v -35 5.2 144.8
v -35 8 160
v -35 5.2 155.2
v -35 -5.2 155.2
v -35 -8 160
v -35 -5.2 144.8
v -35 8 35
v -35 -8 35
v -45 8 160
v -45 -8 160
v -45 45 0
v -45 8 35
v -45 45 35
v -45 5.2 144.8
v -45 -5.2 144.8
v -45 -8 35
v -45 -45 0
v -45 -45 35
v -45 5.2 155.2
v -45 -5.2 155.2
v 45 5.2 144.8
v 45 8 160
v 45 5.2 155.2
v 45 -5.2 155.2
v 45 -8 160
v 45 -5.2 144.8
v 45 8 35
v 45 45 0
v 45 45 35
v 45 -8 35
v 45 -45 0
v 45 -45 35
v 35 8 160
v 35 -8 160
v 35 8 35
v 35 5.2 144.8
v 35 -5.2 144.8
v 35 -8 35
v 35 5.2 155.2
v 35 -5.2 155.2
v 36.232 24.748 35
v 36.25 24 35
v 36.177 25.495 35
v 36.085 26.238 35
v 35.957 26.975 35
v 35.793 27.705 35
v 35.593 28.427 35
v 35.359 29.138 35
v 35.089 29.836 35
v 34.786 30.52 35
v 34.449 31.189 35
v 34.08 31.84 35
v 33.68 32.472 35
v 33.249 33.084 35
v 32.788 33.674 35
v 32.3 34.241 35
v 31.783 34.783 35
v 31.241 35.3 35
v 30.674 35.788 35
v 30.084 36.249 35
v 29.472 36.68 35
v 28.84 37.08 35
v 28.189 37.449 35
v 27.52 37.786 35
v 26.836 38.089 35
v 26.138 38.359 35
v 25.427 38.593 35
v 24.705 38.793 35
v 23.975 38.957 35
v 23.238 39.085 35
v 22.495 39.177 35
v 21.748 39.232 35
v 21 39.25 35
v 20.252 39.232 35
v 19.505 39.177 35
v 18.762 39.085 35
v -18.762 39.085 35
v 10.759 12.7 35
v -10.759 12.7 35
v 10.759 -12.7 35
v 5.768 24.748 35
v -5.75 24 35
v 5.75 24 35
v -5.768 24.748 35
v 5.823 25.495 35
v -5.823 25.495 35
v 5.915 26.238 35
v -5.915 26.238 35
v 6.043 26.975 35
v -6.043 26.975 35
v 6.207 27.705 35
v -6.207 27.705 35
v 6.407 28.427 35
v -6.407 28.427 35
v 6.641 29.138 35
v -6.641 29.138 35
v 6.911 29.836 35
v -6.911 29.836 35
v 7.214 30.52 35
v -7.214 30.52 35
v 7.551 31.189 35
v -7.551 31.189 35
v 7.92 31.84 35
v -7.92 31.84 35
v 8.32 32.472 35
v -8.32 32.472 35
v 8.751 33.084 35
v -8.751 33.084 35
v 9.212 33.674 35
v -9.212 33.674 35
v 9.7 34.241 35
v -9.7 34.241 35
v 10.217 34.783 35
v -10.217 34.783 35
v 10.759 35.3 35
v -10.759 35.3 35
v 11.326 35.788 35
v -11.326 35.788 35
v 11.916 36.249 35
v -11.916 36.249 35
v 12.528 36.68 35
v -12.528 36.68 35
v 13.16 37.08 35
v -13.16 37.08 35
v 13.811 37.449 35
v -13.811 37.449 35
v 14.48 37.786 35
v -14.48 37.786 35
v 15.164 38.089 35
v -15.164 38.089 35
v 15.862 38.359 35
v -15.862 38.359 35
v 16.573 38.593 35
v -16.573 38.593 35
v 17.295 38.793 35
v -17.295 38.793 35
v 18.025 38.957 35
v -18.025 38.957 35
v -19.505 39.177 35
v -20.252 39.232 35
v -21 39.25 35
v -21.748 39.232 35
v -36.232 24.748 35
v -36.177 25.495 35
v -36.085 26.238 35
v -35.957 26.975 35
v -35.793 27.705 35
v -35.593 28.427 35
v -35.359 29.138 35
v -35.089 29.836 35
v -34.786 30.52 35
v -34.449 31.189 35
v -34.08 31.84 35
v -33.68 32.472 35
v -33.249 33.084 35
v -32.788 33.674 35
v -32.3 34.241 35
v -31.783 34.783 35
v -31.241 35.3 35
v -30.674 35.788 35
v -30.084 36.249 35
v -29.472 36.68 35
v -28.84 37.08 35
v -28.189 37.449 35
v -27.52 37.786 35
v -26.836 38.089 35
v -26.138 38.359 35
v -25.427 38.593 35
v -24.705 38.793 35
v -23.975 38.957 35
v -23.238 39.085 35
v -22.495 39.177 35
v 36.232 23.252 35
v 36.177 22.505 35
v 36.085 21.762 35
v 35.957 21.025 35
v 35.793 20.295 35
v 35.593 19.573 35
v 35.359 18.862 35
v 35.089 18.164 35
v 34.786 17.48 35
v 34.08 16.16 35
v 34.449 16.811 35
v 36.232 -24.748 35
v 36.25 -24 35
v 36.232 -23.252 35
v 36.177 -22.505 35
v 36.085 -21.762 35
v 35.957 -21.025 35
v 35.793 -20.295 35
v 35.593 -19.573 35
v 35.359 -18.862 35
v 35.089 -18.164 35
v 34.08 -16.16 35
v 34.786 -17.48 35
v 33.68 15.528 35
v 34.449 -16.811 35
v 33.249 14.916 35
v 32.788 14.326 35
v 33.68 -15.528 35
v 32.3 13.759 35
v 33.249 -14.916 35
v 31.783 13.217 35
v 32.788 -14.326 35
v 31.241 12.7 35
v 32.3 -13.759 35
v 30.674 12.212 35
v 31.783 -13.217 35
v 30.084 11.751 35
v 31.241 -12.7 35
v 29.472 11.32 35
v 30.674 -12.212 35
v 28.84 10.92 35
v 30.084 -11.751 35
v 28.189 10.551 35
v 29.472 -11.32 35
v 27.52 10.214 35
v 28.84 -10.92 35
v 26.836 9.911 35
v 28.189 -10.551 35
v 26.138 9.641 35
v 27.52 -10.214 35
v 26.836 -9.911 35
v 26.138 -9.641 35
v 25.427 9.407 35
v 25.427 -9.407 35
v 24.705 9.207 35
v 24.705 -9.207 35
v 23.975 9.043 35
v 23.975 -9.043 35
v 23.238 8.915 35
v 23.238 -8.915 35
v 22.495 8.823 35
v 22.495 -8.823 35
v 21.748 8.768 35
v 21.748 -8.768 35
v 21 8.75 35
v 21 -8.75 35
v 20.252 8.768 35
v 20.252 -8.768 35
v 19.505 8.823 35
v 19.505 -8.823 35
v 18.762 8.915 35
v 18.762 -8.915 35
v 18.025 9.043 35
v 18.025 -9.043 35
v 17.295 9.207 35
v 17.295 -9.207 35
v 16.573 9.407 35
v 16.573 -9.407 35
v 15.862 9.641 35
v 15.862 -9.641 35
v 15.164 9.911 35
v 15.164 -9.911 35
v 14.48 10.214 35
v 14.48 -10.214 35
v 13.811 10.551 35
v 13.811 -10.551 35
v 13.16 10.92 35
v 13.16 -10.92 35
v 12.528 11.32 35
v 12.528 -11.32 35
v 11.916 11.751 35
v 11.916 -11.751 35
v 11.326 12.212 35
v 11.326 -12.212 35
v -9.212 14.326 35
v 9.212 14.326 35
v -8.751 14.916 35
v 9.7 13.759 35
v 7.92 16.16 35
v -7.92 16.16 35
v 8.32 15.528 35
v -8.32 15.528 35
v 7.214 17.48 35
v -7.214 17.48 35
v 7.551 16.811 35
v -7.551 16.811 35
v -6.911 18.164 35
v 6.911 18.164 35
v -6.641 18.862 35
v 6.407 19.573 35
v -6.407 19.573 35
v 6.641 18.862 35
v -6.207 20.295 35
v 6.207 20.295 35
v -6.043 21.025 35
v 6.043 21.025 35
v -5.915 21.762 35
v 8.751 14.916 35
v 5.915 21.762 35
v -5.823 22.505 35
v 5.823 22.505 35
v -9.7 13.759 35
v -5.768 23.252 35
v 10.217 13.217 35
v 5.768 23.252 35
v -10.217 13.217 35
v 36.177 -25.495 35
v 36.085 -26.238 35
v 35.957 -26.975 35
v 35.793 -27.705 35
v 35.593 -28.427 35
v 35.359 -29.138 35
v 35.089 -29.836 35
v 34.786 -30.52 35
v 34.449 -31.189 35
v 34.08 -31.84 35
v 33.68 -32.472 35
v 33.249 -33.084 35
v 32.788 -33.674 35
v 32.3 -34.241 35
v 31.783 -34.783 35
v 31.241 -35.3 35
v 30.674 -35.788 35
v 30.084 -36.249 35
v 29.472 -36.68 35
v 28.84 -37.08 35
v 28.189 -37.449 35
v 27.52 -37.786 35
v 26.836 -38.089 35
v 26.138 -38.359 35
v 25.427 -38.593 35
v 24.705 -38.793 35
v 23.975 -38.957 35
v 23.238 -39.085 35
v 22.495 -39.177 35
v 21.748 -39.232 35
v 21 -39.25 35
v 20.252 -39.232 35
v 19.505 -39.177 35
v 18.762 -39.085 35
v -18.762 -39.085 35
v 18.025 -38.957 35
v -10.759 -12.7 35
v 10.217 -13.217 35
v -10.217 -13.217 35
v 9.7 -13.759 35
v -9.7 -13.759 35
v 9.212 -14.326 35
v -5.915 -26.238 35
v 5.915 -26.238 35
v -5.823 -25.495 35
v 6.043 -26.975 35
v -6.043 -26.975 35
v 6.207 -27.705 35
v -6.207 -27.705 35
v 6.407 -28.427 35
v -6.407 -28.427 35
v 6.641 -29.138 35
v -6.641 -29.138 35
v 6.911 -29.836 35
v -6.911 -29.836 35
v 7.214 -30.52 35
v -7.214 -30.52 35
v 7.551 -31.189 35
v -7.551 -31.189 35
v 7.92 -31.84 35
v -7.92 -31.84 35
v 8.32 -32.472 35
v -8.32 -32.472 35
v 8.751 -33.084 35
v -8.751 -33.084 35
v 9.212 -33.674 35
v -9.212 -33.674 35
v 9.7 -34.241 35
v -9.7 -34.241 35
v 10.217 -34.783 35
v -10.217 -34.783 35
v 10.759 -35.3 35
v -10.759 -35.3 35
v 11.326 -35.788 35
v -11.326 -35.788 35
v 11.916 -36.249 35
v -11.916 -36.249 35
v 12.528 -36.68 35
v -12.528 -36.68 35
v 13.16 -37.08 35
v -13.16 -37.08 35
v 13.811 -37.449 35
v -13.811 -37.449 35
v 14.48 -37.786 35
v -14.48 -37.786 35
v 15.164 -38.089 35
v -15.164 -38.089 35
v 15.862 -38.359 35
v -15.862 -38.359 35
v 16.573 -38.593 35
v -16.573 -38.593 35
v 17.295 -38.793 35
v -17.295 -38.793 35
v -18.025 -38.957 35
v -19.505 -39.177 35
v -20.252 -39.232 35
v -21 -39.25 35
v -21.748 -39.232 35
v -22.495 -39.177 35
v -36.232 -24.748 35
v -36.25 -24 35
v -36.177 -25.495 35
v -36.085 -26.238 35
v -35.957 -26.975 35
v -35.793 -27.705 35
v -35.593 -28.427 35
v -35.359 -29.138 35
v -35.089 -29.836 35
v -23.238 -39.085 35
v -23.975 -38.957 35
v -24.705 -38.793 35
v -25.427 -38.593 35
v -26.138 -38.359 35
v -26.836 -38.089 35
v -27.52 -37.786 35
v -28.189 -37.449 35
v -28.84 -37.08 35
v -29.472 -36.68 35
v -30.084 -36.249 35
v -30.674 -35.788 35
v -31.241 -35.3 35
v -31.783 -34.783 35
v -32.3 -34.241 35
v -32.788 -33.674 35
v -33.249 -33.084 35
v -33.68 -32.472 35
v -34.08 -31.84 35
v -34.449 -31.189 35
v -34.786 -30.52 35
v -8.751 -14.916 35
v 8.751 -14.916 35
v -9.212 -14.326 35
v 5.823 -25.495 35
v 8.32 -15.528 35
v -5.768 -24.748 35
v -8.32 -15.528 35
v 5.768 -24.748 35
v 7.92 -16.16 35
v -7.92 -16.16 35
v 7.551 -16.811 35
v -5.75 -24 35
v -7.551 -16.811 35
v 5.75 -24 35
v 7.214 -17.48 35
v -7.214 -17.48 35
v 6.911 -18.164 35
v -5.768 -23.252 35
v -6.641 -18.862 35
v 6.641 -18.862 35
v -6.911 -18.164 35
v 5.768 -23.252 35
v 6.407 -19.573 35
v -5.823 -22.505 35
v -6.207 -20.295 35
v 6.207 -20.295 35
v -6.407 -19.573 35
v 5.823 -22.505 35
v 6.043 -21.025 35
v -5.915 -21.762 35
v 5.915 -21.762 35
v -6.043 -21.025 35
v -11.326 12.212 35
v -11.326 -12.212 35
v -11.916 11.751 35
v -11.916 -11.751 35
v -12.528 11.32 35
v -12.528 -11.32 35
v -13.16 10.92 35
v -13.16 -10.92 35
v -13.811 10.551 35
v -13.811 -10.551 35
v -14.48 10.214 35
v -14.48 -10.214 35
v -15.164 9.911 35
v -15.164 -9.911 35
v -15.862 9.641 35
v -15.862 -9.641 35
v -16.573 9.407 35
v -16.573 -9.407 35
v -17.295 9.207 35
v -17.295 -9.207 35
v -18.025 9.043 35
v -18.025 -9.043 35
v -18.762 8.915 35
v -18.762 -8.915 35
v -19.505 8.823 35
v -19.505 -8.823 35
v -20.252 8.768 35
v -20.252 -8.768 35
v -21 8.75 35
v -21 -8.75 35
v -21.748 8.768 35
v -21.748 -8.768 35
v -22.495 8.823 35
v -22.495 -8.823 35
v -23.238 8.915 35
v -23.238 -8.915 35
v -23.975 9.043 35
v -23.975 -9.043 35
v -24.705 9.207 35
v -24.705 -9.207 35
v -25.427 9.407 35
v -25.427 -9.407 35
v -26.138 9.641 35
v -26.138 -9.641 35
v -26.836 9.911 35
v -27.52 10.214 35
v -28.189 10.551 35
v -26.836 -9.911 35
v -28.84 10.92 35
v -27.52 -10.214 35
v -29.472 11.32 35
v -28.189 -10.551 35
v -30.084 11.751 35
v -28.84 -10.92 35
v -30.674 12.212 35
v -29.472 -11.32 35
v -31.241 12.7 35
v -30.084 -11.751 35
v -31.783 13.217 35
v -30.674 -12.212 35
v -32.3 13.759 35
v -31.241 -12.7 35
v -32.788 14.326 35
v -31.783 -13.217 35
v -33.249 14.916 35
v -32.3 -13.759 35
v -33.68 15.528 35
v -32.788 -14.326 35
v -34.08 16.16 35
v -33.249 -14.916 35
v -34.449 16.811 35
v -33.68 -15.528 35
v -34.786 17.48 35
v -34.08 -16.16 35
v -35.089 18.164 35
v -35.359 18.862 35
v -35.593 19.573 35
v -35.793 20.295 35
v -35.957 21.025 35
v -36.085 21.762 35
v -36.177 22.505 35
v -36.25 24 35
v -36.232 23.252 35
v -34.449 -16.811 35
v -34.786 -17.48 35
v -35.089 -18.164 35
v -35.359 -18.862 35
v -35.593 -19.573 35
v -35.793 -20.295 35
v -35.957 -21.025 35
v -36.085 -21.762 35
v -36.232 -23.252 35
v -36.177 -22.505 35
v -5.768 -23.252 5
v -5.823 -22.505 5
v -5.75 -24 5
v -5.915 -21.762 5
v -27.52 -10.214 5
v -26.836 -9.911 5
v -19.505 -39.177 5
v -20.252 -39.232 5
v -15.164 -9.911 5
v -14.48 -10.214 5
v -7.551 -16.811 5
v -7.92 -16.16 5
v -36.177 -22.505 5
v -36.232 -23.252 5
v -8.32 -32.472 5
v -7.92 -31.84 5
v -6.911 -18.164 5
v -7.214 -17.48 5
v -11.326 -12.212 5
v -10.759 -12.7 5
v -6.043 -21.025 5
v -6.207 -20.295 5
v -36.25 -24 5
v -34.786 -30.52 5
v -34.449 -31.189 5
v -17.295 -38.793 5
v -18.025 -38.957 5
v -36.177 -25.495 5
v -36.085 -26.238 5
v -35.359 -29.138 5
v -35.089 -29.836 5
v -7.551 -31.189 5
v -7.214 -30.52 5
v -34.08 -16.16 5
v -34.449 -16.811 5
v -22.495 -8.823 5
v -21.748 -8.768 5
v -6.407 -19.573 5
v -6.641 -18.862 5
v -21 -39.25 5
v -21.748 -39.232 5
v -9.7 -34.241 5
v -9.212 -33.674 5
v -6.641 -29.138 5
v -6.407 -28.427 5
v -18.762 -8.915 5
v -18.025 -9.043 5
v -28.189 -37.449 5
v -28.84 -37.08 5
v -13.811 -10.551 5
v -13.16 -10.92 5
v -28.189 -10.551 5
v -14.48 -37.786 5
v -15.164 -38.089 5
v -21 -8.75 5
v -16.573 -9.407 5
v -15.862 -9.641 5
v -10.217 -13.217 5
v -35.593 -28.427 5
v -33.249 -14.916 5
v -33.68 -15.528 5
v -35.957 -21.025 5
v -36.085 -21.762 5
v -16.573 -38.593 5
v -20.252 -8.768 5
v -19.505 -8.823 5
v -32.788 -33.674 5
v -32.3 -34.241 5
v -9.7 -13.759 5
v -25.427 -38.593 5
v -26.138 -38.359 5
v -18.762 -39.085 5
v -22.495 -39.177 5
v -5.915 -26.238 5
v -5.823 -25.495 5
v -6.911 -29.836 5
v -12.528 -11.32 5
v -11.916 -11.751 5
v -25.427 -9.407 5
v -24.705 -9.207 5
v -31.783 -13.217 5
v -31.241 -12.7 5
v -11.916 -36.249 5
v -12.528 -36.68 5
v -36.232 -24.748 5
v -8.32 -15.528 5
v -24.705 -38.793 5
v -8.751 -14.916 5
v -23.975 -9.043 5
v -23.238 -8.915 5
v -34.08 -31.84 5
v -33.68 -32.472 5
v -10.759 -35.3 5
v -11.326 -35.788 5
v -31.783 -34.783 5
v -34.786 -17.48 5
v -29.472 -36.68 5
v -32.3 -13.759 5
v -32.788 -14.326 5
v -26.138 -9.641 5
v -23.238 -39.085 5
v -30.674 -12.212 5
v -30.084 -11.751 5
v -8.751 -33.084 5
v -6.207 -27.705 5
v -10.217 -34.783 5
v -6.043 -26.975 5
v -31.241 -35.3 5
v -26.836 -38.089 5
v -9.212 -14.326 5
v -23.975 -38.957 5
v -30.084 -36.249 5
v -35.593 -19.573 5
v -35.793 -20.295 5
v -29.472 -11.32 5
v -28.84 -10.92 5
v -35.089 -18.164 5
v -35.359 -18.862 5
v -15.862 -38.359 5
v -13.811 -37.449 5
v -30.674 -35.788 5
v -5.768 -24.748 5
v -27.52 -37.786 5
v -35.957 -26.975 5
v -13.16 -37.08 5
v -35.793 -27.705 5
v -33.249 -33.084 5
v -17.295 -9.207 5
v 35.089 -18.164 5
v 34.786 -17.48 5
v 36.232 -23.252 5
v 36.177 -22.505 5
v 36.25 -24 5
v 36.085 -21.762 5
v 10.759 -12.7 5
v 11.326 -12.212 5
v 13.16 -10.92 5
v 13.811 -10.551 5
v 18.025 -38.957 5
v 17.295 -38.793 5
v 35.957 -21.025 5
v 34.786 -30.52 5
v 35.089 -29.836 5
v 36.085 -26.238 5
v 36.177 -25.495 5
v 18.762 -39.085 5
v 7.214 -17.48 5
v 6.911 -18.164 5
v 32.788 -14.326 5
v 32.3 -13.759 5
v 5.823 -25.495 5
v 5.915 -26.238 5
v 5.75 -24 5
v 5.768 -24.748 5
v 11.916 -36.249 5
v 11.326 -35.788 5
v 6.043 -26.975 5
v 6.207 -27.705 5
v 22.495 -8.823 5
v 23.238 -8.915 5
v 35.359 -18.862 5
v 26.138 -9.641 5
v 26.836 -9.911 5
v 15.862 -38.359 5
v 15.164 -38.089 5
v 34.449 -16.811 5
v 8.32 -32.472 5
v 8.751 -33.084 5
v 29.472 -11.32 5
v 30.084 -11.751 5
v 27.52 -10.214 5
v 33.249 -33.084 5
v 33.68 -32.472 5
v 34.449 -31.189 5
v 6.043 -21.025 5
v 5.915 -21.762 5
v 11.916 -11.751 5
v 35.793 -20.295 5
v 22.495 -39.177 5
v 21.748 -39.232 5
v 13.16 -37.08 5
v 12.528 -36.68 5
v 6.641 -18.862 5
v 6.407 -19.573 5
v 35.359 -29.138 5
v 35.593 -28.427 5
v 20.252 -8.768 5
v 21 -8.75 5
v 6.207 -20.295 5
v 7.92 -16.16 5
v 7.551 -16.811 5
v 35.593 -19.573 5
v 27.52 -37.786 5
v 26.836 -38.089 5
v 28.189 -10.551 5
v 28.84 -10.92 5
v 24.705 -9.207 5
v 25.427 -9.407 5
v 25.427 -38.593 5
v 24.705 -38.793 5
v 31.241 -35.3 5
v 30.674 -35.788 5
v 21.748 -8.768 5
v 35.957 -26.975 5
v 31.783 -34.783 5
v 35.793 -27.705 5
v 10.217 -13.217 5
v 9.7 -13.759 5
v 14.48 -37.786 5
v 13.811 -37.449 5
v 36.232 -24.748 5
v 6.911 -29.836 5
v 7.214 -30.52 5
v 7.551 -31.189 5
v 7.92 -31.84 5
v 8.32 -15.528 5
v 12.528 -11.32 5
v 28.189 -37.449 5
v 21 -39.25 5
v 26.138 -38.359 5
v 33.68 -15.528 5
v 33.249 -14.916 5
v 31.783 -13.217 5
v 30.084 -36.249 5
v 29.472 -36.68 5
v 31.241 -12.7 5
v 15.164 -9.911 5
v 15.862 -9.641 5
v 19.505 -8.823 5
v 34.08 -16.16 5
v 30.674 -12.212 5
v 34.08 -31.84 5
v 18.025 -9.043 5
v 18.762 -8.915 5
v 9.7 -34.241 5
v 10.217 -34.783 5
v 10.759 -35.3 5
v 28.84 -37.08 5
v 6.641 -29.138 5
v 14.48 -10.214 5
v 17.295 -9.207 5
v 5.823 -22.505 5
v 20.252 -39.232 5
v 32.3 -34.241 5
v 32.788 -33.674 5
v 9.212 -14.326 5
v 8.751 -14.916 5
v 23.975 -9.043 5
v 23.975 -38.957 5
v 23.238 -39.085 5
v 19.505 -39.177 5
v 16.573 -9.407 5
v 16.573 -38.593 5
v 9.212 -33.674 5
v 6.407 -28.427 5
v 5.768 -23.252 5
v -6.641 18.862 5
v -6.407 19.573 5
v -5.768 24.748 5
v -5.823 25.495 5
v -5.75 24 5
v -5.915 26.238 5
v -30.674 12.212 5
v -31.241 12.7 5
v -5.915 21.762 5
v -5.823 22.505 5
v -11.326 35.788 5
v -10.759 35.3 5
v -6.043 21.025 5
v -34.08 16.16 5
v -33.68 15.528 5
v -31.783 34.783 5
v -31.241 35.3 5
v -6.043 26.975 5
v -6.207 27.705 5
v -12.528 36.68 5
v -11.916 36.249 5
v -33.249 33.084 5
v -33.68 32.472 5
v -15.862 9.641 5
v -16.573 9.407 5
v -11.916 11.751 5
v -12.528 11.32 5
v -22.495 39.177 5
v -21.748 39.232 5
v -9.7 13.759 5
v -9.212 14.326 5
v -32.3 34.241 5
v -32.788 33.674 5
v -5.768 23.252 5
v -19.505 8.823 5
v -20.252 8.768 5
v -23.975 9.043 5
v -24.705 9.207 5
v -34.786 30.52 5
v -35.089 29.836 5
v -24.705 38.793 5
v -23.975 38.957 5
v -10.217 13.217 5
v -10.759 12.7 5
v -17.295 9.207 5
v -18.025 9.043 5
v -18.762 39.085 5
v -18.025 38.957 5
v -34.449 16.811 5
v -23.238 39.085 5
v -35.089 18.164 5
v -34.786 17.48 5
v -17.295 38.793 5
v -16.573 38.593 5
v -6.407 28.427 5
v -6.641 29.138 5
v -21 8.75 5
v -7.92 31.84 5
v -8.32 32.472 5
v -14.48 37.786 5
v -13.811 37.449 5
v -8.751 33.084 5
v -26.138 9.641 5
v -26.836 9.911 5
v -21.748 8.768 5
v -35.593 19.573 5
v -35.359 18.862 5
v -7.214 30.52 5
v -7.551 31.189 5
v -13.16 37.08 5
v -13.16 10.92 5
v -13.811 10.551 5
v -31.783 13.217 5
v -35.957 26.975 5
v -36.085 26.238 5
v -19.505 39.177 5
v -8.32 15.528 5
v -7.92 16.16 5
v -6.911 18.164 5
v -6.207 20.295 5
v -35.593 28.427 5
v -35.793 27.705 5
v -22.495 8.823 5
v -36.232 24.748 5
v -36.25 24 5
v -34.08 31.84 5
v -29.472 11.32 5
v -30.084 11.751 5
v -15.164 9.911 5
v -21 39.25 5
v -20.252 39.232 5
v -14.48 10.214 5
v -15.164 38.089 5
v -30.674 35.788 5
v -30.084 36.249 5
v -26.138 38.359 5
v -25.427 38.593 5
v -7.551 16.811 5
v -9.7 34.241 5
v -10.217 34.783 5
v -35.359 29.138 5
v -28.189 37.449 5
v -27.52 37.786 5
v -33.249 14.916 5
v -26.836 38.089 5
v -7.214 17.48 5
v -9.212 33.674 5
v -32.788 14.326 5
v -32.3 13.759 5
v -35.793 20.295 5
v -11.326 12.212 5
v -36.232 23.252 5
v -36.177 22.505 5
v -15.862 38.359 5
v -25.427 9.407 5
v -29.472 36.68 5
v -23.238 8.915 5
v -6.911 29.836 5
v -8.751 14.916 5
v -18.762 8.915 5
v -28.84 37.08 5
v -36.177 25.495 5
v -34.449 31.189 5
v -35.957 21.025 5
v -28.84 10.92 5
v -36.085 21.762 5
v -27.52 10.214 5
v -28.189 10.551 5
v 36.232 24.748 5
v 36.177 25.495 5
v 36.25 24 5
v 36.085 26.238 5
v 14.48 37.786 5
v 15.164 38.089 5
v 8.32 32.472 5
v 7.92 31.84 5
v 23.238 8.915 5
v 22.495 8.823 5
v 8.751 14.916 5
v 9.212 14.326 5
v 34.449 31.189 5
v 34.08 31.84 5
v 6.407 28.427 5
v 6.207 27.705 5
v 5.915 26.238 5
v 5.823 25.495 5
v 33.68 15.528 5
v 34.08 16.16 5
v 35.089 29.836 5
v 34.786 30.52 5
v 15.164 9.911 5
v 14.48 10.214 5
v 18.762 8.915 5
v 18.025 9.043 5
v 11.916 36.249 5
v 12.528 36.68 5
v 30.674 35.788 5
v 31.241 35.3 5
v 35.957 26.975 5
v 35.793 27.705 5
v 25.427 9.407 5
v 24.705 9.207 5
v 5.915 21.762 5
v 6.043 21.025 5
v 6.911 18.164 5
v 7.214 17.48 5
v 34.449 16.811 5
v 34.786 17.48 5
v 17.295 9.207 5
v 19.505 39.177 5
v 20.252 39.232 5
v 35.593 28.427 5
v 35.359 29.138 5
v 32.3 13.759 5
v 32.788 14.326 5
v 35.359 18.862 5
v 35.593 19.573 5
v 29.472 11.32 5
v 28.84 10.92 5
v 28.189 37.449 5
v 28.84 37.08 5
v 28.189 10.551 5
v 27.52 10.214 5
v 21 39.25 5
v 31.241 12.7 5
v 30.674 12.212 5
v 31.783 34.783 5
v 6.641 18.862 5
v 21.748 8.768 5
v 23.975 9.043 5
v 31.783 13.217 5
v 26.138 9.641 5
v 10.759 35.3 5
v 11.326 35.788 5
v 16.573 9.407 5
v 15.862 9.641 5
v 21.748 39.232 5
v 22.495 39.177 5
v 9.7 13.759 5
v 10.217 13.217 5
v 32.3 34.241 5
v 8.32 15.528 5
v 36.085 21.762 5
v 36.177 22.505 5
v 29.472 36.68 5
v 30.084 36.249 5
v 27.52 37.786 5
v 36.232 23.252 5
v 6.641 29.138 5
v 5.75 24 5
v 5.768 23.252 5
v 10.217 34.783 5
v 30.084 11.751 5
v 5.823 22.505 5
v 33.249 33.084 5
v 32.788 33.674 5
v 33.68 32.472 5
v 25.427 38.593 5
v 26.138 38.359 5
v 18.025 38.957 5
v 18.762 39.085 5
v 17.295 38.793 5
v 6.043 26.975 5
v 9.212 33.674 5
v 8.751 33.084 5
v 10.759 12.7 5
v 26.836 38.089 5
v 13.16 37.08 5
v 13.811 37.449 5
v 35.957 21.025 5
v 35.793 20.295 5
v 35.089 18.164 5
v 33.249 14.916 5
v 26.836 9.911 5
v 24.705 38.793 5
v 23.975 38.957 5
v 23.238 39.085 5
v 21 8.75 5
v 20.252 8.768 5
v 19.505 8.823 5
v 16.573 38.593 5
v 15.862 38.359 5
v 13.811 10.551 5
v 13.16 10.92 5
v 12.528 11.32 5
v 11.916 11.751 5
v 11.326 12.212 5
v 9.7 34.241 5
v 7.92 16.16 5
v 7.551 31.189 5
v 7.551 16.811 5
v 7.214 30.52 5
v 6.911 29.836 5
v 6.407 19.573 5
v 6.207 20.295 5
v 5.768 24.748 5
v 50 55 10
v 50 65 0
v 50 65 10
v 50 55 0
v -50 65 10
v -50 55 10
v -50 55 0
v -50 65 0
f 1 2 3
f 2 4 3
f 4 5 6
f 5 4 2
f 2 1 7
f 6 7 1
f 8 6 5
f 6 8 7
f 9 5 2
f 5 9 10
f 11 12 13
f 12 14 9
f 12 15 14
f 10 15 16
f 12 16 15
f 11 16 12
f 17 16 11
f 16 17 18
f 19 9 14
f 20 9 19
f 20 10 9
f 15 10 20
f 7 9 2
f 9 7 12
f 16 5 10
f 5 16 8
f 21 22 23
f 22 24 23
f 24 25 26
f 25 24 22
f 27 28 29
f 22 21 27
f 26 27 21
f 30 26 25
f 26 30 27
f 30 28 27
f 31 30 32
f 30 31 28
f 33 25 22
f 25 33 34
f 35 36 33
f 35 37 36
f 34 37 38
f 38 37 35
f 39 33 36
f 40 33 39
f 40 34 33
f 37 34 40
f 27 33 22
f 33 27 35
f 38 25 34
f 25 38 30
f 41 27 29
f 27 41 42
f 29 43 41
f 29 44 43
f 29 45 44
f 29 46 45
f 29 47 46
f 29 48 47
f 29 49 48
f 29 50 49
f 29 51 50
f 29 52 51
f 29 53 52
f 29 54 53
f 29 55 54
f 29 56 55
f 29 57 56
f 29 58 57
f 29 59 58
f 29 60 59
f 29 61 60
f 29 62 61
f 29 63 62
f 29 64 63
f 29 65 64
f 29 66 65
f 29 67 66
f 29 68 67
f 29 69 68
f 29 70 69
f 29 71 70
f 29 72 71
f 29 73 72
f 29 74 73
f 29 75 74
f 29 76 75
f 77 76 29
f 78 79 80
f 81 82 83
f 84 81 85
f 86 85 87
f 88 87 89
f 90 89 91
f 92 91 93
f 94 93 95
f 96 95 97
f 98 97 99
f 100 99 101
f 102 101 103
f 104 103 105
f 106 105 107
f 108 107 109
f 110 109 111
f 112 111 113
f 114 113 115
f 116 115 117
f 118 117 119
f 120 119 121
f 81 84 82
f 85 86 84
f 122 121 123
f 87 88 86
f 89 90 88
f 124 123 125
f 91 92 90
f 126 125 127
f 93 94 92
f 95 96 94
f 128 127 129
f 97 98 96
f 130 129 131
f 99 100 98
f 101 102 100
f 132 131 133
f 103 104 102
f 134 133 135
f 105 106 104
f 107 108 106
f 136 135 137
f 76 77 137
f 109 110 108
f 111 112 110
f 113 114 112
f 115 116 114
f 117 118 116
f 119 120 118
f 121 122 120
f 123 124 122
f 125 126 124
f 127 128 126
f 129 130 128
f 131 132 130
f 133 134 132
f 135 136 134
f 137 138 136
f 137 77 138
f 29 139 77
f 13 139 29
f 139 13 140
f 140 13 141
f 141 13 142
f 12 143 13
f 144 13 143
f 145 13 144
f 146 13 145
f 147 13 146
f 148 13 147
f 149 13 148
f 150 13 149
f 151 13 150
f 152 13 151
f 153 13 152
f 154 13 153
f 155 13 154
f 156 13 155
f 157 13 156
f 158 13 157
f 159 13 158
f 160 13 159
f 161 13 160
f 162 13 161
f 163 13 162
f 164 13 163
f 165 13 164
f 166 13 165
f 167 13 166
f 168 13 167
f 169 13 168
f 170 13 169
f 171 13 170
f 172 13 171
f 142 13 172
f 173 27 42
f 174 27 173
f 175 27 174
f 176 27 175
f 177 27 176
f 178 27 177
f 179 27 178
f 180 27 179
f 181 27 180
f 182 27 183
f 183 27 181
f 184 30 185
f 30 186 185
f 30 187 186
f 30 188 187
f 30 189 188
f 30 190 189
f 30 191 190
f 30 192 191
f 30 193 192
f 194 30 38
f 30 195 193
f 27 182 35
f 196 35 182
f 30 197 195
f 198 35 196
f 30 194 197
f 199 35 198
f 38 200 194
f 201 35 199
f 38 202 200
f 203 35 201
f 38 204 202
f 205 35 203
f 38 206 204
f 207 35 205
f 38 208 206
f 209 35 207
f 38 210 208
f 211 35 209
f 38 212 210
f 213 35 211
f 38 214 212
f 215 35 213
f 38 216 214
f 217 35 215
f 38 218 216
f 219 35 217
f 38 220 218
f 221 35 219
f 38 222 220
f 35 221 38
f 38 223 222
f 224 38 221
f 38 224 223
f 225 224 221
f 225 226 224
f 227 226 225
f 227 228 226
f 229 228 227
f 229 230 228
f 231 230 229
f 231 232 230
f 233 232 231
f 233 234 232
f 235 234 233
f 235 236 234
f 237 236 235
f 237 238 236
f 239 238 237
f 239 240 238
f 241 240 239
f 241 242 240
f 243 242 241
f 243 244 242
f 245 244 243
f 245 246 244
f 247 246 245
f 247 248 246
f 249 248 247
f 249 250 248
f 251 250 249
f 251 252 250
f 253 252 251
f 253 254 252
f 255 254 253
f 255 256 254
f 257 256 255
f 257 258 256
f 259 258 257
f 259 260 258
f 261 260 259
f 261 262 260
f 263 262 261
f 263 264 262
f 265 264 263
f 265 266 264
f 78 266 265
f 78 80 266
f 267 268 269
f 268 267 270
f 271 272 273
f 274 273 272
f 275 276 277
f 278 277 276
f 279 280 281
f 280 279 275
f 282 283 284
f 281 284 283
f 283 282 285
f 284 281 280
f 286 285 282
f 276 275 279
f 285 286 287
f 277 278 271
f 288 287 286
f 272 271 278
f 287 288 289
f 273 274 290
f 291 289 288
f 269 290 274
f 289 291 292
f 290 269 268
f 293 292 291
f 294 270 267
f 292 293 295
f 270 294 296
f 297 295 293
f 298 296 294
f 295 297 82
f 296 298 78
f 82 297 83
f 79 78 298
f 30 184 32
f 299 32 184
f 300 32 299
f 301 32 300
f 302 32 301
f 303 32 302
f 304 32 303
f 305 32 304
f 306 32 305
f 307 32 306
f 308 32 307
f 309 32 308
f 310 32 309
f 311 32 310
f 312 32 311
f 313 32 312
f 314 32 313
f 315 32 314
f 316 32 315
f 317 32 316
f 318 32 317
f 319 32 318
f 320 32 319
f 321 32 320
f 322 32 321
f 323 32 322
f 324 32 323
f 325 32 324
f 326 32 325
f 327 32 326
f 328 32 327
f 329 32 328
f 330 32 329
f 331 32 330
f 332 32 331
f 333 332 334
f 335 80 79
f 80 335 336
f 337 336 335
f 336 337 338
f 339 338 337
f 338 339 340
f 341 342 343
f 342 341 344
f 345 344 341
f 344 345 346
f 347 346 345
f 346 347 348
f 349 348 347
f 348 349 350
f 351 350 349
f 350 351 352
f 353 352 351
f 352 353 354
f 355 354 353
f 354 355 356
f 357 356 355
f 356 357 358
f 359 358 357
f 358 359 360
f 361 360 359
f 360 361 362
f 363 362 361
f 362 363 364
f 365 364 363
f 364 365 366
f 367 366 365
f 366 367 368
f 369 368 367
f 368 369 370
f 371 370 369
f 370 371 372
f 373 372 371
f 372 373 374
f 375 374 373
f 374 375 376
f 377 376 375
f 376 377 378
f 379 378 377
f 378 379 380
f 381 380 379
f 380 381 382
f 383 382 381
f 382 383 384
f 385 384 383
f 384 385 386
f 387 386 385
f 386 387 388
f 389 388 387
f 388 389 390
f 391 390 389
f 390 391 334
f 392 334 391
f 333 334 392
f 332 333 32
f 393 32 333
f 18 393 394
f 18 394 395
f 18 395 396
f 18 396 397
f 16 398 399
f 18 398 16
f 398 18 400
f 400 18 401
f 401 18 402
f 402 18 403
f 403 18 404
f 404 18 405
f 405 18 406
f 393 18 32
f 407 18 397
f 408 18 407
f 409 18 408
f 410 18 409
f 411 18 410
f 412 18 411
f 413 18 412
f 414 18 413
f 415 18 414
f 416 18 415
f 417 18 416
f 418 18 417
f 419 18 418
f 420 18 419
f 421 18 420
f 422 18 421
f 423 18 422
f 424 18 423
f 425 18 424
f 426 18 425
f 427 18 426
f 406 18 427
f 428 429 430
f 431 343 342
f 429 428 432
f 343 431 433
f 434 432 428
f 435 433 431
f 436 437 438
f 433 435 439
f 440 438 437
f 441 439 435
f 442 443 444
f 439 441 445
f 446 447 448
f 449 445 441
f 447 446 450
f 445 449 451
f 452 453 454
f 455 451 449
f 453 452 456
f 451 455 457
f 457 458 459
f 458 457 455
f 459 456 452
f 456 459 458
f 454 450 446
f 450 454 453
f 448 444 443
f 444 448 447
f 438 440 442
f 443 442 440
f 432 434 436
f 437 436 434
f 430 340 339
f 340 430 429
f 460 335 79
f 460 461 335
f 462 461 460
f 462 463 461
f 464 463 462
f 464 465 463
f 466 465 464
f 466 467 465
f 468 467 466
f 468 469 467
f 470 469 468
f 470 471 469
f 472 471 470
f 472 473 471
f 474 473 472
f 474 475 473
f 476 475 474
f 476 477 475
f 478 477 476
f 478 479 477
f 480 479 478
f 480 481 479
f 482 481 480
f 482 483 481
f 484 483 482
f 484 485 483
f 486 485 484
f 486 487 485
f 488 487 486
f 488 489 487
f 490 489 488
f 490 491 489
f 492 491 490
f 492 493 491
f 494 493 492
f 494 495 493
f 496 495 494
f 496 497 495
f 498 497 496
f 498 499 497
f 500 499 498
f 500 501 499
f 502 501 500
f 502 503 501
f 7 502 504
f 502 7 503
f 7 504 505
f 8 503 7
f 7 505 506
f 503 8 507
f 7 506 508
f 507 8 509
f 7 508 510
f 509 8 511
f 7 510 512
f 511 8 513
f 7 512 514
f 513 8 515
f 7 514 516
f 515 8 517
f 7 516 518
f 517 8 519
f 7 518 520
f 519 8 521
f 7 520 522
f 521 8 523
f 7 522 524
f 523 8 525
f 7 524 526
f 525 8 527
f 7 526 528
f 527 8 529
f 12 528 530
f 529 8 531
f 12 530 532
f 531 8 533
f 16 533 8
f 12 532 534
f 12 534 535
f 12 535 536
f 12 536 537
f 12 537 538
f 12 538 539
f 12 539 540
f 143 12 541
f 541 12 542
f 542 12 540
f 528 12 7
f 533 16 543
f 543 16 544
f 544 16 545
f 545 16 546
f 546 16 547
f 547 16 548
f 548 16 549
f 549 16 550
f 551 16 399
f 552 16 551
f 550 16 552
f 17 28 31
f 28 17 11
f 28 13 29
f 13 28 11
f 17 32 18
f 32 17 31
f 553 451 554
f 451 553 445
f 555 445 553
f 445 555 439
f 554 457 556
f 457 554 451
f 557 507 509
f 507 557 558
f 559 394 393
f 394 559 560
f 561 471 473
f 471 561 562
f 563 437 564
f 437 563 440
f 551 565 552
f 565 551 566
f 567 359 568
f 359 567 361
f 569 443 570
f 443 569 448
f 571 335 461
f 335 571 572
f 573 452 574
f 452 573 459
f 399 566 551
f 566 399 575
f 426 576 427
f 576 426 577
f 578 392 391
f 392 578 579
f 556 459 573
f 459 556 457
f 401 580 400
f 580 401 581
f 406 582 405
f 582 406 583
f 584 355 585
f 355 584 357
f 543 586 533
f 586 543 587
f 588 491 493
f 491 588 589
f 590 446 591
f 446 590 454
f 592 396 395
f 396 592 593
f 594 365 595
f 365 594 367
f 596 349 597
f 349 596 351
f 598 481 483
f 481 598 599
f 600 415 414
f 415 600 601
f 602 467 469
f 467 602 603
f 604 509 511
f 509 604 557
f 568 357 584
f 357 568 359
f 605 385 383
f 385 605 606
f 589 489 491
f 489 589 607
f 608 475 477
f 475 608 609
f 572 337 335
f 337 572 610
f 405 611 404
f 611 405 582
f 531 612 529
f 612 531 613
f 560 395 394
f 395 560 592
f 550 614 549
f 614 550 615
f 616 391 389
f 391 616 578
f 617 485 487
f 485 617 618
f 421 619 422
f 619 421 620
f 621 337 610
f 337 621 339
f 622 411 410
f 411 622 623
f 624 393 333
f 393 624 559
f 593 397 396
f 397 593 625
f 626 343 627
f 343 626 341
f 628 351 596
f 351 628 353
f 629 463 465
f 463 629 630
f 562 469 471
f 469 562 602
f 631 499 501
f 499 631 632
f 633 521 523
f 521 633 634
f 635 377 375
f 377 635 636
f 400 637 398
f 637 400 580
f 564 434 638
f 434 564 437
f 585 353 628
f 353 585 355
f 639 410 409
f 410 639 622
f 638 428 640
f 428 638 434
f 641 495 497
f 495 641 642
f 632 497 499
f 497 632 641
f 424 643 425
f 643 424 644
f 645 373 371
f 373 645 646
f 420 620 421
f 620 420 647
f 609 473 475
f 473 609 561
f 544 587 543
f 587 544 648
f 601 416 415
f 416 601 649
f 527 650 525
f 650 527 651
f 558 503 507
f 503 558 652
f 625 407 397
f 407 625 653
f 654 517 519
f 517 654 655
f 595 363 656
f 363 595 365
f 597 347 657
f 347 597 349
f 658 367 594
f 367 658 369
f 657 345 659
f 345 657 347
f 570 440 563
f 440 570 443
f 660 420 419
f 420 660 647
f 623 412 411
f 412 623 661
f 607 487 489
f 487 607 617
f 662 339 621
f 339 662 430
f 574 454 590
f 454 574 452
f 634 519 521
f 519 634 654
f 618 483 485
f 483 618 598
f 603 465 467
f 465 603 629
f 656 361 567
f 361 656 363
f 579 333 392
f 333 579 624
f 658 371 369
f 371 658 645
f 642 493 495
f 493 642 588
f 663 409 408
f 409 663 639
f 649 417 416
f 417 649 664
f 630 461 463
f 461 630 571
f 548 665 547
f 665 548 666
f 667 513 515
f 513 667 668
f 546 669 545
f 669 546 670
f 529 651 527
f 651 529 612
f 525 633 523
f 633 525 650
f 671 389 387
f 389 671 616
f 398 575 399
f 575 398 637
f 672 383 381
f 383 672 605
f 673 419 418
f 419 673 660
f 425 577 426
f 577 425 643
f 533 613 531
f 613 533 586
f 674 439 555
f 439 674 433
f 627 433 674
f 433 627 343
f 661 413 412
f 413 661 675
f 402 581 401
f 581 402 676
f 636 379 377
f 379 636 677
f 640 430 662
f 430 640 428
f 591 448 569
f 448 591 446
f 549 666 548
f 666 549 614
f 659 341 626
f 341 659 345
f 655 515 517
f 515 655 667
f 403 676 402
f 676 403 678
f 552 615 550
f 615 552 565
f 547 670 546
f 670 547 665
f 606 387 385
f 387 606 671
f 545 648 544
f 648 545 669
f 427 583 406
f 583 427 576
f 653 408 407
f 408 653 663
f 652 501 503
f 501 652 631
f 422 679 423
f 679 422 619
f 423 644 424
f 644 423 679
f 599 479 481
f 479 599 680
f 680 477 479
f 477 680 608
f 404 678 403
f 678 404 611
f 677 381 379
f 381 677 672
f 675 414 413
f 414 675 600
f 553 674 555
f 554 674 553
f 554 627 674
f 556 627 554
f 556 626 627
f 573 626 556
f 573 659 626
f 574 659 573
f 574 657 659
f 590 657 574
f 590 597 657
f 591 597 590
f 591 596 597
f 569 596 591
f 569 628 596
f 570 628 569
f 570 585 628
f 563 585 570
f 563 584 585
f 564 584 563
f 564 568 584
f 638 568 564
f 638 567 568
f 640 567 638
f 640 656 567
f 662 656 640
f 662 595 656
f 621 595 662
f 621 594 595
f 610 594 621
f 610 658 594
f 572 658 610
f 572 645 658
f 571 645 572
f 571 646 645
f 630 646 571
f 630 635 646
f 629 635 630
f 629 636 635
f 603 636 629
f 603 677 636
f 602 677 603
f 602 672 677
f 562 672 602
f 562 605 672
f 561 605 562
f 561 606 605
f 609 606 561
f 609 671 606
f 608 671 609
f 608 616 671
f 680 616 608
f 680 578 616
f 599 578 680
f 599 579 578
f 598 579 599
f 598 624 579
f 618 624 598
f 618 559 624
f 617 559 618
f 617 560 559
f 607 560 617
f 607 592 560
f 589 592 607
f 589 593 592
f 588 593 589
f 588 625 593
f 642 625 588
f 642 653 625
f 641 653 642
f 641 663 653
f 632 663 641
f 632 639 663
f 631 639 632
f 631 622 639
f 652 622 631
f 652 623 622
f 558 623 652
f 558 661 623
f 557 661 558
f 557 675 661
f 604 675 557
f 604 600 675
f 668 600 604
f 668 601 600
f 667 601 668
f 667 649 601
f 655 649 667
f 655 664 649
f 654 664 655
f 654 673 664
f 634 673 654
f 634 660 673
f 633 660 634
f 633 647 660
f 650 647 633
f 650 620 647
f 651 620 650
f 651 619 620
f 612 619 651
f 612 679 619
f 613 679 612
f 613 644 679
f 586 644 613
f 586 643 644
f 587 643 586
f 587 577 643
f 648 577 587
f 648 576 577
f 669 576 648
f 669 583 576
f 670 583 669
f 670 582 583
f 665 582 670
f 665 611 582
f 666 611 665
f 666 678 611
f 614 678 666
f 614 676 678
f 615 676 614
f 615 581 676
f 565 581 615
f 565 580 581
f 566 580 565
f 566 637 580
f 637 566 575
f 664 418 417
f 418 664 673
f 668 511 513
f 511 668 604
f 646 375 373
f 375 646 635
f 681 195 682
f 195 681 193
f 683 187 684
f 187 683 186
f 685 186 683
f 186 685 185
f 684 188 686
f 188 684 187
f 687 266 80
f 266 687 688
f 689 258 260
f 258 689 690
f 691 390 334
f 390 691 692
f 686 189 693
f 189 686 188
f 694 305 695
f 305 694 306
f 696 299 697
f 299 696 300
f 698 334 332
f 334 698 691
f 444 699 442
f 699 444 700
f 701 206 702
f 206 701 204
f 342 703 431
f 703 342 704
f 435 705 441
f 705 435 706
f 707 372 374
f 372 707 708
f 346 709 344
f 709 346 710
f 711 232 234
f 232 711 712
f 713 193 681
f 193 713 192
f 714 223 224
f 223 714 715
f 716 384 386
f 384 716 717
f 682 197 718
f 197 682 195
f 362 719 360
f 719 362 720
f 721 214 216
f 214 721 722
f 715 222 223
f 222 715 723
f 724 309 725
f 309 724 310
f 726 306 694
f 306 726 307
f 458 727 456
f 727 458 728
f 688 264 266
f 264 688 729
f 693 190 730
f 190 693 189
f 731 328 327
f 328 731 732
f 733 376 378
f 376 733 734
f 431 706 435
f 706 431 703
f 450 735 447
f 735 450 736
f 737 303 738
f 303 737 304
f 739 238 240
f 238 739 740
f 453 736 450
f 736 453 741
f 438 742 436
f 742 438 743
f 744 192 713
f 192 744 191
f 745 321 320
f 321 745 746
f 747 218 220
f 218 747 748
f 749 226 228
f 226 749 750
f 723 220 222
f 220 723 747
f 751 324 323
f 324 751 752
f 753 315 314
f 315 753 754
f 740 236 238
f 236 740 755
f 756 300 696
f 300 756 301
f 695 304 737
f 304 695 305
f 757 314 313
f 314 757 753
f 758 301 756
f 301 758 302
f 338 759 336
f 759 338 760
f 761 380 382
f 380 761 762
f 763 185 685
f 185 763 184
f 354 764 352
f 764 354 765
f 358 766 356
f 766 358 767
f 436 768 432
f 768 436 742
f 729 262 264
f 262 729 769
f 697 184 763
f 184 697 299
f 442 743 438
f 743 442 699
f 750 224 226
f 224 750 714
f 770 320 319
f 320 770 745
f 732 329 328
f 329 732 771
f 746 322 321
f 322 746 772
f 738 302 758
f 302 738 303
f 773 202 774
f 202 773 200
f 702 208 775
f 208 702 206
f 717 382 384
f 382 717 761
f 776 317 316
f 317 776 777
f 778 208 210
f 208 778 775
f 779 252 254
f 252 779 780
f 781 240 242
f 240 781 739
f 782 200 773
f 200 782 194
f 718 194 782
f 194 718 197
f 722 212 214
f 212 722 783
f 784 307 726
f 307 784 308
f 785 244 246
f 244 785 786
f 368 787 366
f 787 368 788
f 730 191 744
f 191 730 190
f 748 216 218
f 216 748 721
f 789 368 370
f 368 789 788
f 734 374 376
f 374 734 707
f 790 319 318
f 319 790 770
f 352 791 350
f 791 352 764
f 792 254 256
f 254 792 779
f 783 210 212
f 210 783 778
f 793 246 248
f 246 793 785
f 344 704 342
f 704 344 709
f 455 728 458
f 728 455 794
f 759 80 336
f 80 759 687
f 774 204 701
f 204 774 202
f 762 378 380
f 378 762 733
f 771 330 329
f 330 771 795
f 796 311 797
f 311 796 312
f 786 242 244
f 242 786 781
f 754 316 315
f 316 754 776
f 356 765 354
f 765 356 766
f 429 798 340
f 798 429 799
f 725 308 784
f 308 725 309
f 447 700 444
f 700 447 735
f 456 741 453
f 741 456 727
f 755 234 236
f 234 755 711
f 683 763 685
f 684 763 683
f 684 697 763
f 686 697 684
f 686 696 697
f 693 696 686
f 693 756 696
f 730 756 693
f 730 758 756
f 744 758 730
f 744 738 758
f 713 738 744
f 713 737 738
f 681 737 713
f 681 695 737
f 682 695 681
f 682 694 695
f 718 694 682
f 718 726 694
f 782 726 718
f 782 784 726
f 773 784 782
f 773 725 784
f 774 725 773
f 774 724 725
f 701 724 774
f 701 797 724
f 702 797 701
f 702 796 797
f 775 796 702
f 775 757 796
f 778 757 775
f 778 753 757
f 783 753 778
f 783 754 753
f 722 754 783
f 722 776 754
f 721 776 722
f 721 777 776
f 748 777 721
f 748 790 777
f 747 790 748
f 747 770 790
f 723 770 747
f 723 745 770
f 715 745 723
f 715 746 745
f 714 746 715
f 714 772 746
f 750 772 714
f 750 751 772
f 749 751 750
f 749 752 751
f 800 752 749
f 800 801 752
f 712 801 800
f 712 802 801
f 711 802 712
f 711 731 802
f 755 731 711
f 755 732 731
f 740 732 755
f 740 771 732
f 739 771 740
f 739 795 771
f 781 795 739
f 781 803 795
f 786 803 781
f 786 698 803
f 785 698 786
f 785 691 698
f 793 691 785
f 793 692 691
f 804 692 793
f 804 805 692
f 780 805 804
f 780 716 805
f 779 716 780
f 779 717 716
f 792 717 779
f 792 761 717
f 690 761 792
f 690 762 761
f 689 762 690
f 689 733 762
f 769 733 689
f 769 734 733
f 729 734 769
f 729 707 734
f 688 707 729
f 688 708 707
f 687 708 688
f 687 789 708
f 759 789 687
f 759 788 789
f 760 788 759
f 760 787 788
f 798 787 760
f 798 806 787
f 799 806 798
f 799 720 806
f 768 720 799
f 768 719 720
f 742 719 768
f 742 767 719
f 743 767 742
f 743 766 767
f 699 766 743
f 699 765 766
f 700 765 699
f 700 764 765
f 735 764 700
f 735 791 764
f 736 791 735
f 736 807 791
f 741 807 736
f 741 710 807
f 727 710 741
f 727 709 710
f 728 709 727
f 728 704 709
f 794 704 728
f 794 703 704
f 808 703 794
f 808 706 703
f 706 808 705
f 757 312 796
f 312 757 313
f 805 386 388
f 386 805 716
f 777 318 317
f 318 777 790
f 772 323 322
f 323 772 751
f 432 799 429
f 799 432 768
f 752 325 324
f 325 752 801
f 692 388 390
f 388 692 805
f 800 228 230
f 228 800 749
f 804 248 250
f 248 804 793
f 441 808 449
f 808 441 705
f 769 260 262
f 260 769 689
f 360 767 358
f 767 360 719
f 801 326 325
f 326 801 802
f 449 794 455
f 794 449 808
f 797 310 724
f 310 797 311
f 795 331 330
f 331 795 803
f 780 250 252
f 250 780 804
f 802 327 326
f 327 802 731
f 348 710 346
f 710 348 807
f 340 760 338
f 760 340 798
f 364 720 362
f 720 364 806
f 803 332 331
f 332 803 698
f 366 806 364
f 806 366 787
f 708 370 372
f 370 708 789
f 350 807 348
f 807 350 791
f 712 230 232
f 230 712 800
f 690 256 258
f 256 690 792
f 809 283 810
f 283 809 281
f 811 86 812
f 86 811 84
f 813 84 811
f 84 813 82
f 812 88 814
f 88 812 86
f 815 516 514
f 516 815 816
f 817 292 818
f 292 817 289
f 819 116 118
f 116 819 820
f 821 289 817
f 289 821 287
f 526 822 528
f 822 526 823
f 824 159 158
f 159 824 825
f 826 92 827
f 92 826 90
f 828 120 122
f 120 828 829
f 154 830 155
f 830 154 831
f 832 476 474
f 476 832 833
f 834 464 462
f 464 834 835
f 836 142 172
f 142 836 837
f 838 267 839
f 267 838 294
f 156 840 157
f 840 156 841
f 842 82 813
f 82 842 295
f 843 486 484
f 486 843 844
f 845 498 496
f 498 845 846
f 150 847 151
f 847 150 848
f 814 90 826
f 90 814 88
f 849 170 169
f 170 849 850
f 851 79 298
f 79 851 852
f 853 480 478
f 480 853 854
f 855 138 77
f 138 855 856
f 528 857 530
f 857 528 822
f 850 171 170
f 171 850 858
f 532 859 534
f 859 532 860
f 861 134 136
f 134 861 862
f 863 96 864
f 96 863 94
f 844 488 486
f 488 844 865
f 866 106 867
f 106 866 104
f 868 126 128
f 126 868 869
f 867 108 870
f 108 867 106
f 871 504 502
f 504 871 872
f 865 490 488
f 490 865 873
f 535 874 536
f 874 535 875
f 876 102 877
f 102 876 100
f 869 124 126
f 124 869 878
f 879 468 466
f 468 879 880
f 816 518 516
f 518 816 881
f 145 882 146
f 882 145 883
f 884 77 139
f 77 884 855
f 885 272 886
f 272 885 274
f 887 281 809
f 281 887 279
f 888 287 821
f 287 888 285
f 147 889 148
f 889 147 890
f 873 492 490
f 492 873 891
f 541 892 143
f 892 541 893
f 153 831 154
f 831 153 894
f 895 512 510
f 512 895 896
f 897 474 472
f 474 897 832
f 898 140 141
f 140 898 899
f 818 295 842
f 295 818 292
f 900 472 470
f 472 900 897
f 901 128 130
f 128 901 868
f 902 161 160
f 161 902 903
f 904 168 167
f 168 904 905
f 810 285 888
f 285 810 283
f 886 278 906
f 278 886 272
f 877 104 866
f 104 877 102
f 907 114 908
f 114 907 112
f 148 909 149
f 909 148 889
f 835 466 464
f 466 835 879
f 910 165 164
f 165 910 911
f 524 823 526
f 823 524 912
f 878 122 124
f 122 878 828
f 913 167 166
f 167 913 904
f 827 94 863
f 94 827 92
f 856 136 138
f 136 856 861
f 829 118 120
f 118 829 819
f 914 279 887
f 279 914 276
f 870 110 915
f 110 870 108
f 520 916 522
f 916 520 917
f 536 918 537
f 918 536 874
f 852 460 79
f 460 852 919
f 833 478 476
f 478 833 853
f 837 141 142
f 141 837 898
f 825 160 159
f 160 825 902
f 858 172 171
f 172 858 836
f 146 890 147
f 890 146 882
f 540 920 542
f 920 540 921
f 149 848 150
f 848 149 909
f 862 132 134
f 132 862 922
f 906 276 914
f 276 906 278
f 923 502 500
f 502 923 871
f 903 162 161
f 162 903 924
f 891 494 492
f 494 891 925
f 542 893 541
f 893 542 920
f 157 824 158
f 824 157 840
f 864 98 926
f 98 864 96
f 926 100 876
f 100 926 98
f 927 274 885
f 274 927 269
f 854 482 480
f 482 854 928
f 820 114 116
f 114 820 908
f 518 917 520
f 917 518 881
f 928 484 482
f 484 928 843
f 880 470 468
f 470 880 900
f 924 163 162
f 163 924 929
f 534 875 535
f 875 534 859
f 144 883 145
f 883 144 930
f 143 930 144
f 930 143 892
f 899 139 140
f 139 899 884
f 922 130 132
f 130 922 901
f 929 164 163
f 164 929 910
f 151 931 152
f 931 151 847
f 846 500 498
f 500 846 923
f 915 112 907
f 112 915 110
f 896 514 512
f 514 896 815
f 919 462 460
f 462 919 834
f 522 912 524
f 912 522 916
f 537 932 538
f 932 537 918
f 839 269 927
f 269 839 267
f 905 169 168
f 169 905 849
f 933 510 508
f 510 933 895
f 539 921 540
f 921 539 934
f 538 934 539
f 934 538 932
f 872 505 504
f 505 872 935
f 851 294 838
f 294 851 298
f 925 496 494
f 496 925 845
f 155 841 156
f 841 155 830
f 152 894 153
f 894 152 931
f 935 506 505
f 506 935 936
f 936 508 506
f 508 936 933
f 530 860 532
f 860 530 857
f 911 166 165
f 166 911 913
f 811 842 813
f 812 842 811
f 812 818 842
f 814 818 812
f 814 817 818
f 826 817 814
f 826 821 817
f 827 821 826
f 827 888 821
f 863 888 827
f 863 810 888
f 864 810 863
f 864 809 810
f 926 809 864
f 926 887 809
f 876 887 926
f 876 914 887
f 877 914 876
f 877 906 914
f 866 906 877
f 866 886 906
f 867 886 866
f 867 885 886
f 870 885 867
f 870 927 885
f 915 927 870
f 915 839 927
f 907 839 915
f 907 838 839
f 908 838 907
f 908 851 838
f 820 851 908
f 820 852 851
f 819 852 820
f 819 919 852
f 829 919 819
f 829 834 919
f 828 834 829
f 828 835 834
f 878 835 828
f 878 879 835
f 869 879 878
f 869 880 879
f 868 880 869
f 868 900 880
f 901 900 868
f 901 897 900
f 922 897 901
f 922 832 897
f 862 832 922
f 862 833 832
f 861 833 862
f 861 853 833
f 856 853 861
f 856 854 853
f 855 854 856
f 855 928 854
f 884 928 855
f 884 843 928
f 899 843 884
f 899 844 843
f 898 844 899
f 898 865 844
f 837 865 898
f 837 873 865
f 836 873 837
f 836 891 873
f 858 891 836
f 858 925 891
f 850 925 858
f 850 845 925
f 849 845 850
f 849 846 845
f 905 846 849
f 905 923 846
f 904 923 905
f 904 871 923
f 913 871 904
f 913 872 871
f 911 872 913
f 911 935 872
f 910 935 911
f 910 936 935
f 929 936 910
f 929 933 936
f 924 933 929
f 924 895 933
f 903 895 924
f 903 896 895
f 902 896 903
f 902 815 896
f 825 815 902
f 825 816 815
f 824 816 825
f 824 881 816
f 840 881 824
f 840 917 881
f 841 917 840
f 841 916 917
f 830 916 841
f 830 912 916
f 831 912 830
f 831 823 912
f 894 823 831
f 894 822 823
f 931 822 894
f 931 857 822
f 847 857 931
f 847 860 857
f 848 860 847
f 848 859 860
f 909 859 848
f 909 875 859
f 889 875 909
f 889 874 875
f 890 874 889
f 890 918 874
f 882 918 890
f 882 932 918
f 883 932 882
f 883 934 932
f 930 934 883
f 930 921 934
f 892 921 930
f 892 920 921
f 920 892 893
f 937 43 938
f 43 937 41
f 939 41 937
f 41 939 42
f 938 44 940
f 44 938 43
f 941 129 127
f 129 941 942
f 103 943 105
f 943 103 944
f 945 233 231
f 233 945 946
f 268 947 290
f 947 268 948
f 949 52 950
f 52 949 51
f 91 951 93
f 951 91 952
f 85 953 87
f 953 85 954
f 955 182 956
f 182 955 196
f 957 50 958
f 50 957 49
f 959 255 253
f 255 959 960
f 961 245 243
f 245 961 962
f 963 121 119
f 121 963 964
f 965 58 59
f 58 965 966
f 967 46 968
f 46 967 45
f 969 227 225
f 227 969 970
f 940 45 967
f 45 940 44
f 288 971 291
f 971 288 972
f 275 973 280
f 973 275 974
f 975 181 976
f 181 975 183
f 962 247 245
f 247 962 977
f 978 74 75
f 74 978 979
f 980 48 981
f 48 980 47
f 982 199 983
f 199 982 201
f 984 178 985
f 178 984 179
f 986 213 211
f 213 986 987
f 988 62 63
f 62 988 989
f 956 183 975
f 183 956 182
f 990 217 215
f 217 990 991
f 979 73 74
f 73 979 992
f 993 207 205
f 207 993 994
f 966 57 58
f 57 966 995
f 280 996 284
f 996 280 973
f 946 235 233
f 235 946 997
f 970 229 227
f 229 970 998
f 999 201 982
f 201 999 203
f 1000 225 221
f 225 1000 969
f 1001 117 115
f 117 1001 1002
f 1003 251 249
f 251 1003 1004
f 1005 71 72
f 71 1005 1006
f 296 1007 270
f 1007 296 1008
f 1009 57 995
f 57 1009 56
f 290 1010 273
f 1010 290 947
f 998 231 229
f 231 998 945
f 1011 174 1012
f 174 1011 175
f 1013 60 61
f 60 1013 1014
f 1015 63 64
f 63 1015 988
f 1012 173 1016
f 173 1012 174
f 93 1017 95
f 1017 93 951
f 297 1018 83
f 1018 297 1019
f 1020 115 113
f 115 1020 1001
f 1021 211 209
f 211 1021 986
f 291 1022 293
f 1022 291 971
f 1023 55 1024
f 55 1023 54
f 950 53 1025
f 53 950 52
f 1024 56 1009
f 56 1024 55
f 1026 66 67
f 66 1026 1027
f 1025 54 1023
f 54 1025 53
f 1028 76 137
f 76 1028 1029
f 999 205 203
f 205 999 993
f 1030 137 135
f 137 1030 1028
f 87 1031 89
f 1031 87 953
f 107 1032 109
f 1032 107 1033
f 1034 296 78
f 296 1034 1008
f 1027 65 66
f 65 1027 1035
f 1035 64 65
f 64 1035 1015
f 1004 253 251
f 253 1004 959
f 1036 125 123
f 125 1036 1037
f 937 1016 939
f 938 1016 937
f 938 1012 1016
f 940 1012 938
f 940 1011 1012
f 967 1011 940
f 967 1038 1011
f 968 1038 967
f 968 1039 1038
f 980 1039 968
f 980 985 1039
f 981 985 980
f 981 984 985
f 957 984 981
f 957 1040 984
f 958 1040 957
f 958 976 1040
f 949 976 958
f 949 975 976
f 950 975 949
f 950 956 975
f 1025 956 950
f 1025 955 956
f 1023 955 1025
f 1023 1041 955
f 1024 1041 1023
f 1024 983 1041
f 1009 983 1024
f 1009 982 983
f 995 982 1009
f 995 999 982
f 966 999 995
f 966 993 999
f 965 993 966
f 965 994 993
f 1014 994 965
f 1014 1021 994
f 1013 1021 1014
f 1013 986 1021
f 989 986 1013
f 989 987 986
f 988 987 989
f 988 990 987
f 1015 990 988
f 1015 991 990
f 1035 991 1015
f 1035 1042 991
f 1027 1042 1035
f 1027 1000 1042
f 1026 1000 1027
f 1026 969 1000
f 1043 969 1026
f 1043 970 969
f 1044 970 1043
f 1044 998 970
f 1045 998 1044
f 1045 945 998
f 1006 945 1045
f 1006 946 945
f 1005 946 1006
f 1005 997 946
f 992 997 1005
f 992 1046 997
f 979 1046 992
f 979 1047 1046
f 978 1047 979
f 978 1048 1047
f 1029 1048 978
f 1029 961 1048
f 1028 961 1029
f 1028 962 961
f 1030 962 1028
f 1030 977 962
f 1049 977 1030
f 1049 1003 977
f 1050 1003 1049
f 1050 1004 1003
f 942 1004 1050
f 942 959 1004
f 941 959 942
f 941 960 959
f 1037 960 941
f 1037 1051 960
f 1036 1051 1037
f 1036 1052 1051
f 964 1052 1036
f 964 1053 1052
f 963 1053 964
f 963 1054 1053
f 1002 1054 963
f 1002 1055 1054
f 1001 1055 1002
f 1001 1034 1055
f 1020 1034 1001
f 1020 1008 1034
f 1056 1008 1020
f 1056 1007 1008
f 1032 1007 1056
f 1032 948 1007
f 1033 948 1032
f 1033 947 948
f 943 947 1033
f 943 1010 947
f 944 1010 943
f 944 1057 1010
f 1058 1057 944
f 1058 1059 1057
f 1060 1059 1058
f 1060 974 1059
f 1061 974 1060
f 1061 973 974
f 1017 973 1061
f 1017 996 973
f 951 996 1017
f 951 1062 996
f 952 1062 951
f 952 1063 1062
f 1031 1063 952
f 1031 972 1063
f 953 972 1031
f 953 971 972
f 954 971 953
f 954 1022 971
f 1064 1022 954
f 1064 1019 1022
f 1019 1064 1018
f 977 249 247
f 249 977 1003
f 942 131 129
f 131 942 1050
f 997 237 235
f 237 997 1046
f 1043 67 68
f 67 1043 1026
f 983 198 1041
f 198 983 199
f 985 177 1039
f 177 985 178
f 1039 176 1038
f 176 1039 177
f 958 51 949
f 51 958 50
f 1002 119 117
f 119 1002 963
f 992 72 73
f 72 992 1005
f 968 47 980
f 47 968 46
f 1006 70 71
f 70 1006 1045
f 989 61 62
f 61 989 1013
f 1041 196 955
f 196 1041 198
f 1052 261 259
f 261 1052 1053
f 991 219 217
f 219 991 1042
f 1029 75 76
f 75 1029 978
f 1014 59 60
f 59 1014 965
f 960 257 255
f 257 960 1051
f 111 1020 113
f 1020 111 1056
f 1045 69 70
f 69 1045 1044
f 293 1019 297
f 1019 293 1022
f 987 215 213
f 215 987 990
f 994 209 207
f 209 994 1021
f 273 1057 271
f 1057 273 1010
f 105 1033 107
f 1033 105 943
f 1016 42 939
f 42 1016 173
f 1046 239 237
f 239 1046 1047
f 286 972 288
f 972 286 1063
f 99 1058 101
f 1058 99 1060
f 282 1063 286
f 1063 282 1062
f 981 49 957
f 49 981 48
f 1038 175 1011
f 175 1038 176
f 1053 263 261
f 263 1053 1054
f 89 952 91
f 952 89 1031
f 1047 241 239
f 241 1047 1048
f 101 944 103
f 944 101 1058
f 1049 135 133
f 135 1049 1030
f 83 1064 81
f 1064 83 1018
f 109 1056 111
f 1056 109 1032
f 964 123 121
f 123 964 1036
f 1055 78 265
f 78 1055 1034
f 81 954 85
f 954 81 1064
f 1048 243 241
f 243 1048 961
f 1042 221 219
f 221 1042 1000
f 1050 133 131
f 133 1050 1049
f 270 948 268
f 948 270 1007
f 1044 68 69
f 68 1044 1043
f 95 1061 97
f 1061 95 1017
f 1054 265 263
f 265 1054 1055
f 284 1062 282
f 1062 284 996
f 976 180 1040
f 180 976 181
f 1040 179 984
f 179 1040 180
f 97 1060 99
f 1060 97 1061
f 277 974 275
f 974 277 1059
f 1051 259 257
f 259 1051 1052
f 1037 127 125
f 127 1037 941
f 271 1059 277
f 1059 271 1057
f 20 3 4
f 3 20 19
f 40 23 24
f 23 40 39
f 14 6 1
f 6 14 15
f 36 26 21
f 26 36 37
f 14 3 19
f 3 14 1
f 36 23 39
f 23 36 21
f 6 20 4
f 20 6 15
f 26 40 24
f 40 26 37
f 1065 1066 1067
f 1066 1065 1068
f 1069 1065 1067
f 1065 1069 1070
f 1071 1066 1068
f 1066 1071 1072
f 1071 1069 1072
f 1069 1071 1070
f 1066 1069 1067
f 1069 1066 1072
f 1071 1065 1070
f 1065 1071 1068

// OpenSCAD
// Carrier for four 50 mL conical tubes with a carrying handle; two parts printed side by side
// Category: hardware. Part 1: a base block with four blind seats and two posts with square holes
// near the top. Part 2: a square handle bar, printed lying flat, pushed through both posts.
// Print: PETG, 0.2 mm layers, 4 perimeters; the posts are tall, so print slowly near the top.
// A drop of glue (or a tight fit) keeps the bar in place.
// SPDX-License-Identifier: CERN-OHL-P-2.0

/* [Carrier] */
base = [90, 90, 35];      // X, Y, Z [mm], centred on the origin
seat_d = 30.5;            // 50 mL conical tube is ~29-30 mm across
seat_depth = 30;          // 5 mm floor
seat_pos = [[-21, -24], [21, -24], [-21, 24], [21, 24]];
post = [10, 16];          // post X, Y; flush with the X end faces, centred on y = 0
post_top = 160;
hole = 10.4;              // square hole along X for the handle bar
hole_z = 150;
bar = [100, 10, 10];      // handle bar X, Y, Z
bar_gap = 10;             // gap between the bar and the base's +Y face

/* [Hidden] */
eps = 0.01;

// part 1: carrier
difference() {
    union() {
        translate([-base.x / 2, -base.y / 2, 0]) cube(base);
        for (s = [-1, 1])
            translate([s > 0 ? base.x / 2 - post.x : -base.x / 2, -post.y / 2, base.z - eps])
                cube([post.x, post.y, post_top - base.z + eps]);
    }
    for (p = seat_pos)
        translate([p.x, p.y, base.z - seat_depth]) cylinder(d = seat_d, h = seat_depth + 1, $fn = 128);
    translate([-base.x / 2 - 1, -hole / 2, hole_z - hole / 2]) cube([base.x + 2, hole, hole]);
}
// part 2: handle bar, beside the base on the +Y side
translate([-bar.x / 2, base.y / 2 + bar_gap, 0]) cube(bar);
